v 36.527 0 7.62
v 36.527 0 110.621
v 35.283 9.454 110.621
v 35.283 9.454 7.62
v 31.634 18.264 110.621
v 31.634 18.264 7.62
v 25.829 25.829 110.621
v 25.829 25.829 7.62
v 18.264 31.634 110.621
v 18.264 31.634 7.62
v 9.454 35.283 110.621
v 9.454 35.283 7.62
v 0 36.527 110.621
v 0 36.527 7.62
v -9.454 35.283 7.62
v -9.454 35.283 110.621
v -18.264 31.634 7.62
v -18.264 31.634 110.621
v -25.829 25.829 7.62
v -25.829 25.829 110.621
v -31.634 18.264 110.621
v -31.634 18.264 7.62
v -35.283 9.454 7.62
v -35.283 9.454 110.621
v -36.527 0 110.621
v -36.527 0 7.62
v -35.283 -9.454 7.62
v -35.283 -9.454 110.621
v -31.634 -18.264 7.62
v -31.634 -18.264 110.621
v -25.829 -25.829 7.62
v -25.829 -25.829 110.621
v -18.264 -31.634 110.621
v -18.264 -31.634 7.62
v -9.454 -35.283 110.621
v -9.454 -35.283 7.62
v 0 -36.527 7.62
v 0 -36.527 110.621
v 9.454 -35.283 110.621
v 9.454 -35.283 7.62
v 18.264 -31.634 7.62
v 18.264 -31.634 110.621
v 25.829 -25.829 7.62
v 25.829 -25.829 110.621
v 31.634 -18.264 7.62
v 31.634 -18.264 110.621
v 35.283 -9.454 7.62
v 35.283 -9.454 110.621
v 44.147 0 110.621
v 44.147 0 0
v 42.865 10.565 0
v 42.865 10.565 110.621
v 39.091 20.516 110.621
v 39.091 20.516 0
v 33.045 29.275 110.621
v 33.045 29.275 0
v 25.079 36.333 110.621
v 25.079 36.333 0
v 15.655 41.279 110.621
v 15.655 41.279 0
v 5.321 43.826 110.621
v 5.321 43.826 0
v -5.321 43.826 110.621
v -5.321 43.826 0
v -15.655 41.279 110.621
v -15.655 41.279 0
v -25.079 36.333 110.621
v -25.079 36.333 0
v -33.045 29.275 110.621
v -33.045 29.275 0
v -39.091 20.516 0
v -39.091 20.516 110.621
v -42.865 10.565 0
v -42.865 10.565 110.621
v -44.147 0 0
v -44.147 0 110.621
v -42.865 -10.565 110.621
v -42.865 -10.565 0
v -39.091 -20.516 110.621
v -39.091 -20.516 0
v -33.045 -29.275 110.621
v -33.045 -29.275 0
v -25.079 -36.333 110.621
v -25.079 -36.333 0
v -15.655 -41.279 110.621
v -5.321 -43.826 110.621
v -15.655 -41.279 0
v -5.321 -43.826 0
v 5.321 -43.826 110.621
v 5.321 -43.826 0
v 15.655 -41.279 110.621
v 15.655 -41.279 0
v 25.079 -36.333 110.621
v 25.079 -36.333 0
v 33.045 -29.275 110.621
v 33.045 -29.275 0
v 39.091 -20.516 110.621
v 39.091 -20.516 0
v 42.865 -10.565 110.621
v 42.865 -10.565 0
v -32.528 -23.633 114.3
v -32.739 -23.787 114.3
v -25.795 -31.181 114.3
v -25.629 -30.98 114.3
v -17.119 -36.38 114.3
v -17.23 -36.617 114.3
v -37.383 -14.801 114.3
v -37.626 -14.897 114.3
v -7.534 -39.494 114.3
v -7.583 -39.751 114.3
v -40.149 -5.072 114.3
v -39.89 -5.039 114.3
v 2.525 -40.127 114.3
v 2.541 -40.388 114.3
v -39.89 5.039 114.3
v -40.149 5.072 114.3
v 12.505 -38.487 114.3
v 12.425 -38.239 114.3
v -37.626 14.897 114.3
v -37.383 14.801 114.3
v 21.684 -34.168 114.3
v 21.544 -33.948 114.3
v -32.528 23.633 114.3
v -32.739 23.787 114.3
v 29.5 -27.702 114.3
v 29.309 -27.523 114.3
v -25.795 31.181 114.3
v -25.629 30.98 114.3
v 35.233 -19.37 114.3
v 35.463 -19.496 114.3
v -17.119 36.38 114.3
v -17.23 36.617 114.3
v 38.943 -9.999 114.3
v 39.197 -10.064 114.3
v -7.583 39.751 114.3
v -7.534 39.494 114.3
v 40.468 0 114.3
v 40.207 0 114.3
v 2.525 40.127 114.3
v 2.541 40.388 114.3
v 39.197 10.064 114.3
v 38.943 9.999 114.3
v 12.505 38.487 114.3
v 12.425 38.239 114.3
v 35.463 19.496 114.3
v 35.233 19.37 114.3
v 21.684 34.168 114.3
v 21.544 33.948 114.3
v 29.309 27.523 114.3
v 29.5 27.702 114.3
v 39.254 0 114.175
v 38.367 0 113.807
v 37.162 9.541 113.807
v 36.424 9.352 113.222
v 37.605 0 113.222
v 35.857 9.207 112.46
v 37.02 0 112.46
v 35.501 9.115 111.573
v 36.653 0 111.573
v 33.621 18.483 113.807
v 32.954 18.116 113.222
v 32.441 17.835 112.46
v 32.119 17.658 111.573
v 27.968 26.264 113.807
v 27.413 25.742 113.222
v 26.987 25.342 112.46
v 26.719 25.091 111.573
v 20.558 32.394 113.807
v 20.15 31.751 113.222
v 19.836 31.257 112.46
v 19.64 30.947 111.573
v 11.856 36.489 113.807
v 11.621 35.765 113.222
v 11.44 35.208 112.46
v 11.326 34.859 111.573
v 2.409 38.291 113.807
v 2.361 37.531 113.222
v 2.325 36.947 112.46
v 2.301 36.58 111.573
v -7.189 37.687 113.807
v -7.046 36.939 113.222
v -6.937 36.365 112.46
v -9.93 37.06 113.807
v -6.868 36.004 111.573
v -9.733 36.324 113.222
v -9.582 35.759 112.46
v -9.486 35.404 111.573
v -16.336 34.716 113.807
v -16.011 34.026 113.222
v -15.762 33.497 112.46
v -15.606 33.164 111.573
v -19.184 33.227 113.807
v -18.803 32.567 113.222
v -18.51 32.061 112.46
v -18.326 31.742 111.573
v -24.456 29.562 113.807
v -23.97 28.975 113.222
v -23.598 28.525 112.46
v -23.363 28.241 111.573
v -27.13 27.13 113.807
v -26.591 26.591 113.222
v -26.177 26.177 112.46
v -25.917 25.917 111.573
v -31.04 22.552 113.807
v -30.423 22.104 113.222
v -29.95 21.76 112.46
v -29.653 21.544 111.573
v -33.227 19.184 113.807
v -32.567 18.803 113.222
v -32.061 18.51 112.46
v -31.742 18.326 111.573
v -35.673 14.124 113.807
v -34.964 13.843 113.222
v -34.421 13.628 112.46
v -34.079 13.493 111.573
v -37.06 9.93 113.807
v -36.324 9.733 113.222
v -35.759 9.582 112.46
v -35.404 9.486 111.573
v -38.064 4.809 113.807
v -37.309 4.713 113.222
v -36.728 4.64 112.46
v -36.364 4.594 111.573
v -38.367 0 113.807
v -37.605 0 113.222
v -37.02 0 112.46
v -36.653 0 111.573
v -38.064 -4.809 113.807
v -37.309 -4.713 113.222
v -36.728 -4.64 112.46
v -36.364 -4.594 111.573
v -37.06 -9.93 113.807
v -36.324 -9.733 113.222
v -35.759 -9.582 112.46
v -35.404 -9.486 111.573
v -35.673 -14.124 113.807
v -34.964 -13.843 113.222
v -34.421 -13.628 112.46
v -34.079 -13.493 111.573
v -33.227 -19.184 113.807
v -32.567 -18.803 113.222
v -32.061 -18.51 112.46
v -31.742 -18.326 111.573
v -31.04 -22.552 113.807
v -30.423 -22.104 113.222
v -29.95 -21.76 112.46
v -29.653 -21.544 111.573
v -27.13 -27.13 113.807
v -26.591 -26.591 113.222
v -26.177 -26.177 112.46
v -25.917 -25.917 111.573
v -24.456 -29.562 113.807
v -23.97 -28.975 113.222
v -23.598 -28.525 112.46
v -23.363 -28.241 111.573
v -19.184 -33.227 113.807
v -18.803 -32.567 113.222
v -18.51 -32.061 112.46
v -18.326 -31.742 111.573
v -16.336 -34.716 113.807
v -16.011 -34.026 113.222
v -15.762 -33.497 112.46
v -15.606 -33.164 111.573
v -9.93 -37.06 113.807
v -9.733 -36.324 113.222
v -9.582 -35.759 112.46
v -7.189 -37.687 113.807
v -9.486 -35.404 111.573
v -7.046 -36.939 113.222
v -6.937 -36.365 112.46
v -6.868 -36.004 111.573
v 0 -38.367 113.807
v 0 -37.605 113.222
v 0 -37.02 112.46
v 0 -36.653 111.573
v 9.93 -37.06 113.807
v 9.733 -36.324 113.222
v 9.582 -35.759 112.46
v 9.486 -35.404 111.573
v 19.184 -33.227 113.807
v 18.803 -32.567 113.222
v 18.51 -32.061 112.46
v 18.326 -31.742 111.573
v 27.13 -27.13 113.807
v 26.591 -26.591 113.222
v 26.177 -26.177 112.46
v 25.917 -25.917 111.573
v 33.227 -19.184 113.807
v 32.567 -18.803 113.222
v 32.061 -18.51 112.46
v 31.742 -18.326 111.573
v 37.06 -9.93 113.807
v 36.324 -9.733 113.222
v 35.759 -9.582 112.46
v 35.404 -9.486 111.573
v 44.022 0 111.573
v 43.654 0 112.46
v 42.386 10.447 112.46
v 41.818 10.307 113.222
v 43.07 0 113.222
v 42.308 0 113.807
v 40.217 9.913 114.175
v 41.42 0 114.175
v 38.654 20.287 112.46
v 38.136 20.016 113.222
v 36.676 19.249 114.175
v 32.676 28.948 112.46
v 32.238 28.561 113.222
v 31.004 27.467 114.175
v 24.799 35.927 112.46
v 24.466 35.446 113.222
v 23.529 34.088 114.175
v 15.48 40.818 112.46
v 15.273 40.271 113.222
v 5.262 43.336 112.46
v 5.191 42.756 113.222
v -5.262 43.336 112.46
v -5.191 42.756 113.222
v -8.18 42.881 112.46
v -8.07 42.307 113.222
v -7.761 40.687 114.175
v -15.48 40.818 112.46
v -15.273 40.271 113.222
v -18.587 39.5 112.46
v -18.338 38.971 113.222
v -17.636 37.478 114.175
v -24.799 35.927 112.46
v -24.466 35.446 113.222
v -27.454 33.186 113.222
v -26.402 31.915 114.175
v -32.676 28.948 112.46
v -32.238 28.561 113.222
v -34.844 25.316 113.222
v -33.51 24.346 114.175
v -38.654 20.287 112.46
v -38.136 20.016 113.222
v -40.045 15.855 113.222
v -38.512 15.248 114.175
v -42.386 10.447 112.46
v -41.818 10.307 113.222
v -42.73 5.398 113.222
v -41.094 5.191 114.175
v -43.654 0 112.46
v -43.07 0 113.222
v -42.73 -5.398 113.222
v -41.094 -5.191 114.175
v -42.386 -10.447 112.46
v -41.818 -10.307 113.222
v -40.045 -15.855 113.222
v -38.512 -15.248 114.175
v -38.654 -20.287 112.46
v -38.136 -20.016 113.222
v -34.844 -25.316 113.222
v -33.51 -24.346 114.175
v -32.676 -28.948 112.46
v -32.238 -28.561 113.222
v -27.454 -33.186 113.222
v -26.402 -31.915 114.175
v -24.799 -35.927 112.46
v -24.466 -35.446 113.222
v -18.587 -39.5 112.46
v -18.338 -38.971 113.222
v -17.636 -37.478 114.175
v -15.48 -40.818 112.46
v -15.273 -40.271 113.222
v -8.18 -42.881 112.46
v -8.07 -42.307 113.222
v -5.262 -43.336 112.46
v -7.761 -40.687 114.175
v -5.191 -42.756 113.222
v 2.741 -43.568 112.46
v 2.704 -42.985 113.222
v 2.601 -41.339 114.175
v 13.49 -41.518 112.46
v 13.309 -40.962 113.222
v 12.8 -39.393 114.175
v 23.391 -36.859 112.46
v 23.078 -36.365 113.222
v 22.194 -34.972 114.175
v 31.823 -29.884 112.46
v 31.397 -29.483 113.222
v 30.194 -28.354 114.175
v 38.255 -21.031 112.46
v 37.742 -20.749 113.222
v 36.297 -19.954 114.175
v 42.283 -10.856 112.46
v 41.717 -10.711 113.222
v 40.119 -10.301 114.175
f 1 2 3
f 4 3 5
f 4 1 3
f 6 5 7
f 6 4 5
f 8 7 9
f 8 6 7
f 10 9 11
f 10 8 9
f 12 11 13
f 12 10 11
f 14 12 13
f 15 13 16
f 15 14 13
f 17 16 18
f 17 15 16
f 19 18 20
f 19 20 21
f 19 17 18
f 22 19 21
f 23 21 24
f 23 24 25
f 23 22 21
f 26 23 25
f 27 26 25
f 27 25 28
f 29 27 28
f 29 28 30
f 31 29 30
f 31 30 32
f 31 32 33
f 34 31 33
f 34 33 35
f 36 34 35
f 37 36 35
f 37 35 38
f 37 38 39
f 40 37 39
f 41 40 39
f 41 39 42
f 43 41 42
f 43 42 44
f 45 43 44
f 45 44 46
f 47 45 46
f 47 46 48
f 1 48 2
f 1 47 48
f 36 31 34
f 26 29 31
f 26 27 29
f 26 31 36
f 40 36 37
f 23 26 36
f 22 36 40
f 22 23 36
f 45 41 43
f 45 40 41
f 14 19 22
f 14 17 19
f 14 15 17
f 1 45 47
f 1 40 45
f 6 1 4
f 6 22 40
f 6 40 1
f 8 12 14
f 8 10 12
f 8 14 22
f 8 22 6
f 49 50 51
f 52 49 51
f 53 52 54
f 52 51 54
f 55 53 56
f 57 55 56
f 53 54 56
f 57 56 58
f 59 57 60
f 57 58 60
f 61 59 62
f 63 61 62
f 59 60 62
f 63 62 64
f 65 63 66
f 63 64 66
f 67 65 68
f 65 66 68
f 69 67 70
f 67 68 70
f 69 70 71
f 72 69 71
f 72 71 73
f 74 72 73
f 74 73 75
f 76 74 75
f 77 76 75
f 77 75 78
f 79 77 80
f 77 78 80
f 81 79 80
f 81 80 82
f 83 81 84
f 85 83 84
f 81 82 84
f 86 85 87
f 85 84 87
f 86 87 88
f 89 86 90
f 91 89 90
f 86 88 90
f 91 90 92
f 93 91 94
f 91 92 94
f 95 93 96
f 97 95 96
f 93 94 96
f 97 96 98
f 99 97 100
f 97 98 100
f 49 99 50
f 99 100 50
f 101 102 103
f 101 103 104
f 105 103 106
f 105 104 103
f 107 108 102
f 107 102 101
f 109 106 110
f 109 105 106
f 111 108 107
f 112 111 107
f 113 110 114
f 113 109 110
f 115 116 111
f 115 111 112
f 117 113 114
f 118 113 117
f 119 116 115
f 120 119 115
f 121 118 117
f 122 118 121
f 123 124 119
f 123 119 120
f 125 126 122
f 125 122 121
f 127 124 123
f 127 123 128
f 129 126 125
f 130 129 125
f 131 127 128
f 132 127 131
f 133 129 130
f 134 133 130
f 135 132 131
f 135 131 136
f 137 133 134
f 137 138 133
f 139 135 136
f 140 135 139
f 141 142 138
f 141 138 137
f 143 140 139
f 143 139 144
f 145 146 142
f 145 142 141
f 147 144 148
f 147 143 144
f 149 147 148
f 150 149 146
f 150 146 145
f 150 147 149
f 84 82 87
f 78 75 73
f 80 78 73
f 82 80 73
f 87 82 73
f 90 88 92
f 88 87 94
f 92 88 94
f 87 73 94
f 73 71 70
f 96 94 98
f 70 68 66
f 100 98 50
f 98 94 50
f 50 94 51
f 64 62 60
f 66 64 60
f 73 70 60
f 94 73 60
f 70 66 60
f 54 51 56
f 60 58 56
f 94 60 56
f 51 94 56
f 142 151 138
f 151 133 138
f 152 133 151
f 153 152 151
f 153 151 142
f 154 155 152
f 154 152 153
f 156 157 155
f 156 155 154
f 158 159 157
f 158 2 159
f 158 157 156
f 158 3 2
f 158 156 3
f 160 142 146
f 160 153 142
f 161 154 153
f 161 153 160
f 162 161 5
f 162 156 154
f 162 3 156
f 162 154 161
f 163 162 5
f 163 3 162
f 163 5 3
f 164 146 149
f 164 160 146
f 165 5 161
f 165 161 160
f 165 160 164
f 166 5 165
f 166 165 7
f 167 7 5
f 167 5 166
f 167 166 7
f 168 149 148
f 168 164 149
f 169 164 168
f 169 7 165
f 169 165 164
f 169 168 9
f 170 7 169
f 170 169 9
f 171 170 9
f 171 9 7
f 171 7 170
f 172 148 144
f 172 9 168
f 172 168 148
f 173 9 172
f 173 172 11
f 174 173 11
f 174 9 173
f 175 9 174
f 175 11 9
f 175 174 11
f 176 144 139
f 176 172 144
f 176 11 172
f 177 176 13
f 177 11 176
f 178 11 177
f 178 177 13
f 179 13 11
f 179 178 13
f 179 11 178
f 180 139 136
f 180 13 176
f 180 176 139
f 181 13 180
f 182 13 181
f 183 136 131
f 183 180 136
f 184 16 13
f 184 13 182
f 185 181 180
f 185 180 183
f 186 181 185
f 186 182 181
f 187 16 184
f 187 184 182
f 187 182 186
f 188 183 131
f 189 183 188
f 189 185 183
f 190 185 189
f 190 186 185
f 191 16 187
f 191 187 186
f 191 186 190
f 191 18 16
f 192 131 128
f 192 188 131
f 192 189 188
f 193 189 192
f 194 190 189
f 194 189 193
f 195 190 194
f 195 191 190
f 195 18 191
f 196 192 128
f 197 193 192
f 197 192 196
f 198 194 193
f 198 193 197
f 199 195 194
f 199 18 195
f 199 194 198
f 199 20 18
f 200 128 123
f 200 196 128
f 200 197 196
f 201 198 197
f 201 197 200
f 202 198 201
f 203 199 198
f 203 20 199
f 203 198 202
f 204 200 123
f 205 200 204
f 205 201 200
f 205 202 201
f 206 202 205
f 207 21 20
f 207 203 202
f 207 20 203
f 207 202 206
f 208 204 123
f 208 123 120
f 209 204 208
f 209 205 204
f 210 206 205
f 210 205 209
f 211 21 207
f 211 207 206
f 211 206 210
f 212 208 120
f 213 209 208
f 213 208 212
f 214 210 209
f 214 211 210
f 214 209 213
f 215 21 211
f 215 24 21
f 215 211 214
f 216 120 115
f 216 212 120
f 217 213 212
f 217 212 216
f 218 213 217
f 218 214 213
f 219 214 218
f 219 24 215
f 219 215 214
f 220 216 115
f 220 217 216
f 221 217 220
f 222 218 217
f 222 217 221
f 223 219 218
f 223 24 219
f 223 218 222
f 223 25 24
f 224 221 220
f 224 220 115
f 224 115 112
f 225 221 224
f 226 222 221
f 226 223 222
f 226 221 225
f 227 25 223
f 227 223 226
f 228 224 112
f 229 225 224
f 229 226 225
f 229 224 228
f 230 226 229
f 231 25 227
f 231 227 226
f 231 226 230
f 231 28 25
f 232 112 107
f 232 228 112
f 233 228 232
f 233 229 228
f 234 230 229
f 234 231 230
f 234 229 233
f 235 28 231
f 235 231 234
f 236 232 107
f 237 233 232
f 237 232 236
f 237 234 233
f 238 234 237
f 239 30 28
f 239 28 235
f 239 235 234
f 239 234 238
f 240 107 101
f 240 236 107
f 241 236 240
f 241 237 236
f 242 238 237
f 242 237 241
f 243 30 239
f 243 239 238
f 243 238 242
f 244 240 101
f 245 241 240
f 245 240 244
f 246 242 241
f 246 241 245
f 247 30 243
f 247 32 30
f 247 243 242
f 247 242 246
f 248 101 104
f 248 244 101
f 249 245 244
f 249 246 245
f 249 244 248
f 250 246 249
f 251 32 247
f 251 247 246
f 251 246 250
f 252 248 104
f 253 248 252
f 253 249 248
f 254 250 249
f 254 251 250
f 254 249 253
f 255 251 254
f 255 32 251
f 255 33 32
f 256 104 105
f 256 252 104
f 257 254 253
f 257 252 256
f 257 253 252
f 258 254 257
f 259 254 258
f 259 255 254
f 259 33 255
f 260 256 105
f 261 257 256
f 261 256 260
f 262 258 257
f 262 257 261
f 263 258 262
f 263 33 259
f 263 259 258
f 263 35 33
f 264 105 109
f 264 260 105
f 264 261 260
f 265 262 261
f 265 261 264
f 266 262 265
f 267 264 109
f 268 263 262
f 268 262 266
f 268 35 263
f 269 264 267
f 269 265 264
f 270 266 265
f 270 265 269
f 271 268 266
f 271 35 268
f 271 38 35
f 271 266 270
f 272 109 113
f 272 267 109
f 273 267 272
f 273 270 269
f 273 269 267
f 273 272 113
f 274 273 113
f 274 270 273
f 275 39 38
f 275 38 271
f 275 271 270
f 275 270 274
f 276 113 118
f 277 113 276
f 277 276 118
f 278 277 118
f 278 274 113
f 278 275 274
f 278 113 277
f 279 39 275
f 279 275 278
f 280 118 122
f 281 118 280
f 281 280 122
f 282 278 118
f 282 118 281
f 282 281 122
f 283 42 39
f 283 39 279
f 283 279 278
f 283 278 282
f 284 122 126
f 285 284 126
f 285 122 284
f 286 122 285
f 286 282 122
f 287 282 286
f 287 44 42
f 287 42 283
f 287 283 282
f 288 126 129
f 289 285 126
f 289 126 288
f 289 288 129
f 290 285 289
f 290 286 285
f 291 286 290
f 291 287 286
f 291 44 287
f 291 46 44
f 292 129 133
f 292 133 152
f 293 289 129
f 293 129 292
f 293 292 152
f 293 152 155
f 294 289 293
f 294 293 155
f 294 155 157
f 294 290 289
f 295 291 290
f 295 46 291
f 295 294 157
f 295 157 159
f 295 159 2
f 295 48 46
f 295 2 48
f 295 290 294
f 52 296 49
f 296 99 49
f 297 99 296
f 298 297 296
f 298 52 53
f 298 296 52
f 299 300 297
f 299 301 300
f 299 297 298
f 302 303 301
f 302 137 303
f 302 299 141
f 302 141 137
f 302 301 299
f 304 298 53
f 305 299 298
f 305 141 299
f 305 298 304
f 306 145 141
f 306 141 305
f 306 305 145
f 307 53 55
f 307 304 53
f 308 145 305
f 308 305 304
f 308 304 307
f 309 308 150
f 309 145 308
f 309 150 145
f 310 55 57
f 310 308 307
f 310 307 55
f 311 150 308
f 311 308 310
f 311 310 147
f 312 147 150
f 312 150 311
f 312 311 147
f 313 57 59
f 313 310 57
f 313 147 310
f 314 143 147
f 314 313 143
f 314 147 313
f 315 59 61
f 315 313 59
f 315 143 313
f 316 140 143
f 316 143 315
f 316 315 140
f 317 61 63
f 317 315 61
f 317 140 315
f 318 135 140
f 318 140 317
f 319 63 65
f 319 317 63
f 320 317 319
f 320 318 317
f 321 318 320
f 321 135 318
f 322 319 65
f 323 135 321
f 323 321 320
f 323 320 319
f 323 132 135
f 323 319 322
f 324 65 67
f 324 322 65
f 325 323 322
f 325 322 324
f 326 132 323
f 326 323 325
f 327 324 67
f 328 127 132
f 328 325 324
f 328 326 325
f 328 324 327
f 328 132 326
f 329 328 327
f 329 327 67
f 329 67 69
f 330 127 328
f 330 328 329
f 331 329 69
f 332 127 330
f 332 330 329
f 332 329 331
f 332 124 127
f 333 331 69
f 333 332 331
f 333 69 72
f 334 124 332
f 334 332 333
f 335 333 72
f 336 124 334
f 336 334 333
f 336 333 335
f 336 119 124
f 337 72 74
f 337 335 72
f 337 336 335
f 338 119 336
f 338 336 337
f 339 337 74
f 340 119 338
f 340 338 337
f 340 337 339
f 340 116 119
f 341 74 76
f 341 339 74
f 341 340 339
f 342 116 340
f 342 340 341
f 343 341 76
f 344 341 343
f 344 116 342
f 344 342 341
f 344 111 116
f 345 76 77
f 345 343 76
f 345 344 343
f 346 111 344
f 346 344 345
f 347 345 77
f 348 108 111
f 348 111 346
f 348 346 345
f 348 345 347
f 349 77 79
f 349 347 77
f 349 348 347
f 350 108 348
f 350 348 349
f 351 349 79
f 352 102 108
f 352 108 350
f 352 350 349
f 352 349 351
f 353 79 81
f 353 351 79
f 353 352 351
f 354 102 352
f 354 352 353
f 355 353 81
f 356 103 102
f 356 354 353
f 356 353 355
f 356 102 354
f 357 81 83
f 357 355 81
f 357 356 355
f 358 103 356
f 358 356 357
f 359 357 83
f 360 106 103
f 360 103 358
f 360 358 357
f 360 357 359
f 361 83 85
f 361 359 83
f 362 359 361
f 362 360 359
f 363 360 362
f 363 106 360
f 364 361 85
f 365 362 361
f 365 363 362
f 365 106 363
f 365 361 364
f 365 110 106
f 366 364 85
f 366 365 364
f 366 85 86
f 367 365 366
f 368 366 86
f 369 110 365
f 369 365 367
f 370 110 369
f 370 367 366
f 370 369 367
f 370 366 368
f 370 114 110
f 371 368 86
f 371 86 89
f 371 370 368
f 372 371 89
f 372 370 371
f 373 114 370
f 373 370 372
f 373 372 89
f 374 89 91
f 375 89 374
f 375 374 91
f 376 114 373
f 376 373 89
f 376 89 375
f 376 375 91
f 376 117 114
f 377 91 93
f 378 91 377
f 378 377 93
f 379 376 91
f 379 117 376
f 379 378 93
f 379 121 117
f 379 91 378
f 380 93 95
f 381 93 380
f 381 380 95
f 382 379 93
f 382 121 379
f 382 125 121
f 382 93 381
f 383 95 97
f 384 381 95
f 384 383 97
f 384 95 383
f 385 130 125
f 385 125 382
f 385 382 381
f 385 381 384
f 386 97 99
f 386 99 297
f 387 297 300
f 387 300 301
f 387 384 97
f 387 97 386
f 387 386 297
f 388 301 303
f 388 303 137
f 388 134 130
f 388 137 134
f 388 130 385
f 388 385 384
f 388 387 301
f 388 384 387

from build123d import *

# Parameters (mm, degrees)
F0_R     = 44.1474000208
F1_DEPTH = 114.3
F2_T     = -7.62
F3_R     = 3.6792614691


with BuildPart() as f1:
    # F0 (on Top) → F1 (new body)
    with BuildSketch(Plane.XY):
        Circle(F0_R)
    extrude(amount=F1_DEPTH)

    # F2
    f2_openings = [f1.faces().sort_by_distance(p)[0] for p in [
        (0, 0, 114.3),
    ]]
    offset(amount=F2_T, openings=f2_openings)

    # F3
    f3_edges = [f1.edges().sort_by_distance(p)[0] for p in [
        (-44.1474, 0, 114.3),
        (-36.5274, 0, 114.3),
    ]]
    fillet(f3_edges, radius=F3_R)


solid = f1.part
